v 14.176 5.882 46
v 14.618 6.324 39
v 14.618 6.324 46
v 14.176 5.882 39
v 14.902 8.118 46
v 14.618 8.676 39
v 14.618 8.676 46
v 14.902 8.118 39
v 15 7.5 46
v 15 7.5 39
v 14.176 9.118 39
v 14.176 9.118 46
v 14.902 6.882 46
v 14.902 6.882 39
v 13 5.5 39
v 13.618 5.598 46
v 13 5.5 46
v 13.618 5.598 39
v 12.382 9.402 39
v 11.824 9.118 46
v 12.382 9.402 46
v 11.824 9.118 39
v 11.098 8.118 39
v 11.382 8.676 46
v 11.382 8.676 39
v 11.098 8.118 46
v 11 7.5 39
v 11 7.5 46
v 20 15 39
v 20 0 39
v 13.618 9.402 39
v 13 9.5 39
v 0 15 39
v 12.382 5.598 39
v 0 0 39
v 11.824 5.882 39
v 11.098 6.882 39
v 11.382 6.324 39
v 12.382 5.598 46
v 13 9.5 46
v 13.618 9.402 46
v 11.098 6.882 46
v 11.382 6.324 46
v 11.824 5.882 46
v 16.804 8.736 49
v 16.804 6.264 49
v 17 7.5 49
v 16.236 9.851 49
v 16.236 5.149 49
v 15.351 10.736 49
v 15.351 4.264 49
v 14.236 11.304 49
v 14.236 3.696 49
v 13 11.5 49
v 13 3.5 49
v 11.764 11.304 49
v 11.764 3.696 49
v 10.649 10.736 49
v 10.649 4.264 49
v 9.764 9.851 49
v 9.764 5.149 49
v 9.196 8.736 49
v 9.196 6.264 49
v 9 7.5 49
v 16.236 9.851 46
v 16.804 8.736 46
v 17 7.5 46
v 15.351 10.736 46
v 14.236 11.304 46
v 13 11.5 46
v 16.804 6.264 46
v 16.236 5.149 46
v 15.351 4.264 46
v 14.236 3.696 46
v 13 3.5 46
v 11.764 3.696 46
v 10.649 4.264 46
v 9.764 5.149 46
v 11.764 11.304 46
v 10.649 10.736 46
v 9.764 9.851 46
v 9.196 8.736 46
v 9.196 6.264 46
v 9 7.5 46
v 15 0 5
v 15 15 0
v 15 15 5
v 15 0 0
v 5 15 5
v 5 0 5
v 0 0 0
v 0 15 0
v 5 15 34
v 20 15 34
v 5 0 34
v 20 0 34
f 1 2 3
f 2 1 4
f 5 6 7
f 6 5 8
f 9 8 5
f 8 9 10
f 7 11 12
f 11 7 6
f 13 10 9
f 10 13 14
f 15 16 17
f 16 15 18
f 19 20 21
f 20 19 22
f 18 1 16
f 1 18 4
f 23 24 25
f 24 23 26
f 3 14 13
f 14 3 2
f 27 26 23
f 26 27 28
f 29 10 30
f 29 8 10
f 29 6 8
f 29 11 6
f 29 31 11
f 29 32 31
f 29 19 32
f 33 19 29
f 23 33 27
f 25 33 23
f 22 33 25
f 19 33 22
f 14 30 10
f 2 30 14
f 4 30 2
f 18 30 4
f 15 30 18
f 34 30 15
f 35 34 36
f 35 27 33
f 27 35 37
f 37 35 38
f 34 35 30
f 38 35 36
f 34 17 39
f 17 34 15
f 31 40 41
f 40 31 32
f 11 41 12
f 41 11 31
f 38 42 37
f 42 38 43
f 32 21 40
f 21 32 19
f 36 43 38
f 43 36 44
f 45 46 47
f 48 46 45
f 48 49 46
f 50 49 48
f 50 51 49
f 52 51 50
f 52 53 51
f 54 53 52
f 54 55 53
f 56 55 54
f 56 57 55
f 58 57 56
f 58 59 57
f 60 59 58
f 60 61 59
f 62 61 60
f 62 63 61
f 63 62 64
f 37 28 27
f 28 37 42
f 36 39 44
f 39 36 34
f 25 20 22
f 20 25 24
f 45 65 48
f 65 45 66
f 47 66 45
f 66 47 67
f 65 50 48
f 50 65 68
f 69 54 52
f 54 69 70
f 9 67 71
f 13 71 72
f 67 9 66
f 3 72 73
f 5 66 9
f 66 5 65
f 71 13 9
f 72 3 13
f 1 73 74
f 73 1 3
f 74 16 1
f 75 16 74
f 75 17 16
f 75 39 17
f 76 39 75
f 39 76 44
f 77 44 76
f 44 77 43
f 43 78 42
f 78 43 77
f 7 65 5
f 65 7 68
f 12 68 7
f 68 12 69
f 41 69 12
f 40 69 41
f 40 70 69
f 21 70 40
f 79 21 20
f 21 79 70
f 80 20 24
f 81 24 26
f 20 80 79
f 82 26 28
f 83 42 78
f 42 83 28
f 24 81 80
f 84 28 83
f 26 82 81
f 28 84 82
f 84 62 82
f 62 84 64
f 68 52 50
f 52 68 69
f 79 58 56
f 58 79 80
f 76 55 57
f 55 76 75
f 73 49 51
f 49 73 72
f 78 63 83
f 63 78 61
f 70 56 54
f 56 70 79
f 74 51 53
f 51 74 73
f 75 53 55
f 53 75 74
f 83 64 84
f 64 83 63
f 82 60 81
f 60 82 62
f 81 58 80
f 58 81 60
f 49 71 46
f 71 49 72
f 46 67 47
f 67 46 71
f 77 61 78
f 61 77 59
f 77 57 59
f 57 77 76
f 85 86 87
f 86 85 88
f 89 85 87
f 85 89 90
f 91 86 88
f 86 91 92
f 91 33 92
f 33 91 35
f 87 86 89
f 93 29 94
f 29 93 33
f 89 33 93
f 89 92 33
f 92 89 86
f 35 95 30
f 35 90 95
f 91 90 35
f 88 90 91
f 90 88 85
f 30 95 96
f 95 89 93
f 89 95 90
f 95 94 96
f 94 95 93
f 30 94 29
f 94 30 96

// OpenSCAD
$fn = 20;

width = 15;

cube([15, width, 5]);
cube([5, width, 34]);
translate([0, 0, 34]) cube([20, width, 5]);

translate([13, width/2, 39]) {
	cylinder(d=4, h=10);
	translate([0, 0, 7]) cylinder(d=8, h=3);
}
